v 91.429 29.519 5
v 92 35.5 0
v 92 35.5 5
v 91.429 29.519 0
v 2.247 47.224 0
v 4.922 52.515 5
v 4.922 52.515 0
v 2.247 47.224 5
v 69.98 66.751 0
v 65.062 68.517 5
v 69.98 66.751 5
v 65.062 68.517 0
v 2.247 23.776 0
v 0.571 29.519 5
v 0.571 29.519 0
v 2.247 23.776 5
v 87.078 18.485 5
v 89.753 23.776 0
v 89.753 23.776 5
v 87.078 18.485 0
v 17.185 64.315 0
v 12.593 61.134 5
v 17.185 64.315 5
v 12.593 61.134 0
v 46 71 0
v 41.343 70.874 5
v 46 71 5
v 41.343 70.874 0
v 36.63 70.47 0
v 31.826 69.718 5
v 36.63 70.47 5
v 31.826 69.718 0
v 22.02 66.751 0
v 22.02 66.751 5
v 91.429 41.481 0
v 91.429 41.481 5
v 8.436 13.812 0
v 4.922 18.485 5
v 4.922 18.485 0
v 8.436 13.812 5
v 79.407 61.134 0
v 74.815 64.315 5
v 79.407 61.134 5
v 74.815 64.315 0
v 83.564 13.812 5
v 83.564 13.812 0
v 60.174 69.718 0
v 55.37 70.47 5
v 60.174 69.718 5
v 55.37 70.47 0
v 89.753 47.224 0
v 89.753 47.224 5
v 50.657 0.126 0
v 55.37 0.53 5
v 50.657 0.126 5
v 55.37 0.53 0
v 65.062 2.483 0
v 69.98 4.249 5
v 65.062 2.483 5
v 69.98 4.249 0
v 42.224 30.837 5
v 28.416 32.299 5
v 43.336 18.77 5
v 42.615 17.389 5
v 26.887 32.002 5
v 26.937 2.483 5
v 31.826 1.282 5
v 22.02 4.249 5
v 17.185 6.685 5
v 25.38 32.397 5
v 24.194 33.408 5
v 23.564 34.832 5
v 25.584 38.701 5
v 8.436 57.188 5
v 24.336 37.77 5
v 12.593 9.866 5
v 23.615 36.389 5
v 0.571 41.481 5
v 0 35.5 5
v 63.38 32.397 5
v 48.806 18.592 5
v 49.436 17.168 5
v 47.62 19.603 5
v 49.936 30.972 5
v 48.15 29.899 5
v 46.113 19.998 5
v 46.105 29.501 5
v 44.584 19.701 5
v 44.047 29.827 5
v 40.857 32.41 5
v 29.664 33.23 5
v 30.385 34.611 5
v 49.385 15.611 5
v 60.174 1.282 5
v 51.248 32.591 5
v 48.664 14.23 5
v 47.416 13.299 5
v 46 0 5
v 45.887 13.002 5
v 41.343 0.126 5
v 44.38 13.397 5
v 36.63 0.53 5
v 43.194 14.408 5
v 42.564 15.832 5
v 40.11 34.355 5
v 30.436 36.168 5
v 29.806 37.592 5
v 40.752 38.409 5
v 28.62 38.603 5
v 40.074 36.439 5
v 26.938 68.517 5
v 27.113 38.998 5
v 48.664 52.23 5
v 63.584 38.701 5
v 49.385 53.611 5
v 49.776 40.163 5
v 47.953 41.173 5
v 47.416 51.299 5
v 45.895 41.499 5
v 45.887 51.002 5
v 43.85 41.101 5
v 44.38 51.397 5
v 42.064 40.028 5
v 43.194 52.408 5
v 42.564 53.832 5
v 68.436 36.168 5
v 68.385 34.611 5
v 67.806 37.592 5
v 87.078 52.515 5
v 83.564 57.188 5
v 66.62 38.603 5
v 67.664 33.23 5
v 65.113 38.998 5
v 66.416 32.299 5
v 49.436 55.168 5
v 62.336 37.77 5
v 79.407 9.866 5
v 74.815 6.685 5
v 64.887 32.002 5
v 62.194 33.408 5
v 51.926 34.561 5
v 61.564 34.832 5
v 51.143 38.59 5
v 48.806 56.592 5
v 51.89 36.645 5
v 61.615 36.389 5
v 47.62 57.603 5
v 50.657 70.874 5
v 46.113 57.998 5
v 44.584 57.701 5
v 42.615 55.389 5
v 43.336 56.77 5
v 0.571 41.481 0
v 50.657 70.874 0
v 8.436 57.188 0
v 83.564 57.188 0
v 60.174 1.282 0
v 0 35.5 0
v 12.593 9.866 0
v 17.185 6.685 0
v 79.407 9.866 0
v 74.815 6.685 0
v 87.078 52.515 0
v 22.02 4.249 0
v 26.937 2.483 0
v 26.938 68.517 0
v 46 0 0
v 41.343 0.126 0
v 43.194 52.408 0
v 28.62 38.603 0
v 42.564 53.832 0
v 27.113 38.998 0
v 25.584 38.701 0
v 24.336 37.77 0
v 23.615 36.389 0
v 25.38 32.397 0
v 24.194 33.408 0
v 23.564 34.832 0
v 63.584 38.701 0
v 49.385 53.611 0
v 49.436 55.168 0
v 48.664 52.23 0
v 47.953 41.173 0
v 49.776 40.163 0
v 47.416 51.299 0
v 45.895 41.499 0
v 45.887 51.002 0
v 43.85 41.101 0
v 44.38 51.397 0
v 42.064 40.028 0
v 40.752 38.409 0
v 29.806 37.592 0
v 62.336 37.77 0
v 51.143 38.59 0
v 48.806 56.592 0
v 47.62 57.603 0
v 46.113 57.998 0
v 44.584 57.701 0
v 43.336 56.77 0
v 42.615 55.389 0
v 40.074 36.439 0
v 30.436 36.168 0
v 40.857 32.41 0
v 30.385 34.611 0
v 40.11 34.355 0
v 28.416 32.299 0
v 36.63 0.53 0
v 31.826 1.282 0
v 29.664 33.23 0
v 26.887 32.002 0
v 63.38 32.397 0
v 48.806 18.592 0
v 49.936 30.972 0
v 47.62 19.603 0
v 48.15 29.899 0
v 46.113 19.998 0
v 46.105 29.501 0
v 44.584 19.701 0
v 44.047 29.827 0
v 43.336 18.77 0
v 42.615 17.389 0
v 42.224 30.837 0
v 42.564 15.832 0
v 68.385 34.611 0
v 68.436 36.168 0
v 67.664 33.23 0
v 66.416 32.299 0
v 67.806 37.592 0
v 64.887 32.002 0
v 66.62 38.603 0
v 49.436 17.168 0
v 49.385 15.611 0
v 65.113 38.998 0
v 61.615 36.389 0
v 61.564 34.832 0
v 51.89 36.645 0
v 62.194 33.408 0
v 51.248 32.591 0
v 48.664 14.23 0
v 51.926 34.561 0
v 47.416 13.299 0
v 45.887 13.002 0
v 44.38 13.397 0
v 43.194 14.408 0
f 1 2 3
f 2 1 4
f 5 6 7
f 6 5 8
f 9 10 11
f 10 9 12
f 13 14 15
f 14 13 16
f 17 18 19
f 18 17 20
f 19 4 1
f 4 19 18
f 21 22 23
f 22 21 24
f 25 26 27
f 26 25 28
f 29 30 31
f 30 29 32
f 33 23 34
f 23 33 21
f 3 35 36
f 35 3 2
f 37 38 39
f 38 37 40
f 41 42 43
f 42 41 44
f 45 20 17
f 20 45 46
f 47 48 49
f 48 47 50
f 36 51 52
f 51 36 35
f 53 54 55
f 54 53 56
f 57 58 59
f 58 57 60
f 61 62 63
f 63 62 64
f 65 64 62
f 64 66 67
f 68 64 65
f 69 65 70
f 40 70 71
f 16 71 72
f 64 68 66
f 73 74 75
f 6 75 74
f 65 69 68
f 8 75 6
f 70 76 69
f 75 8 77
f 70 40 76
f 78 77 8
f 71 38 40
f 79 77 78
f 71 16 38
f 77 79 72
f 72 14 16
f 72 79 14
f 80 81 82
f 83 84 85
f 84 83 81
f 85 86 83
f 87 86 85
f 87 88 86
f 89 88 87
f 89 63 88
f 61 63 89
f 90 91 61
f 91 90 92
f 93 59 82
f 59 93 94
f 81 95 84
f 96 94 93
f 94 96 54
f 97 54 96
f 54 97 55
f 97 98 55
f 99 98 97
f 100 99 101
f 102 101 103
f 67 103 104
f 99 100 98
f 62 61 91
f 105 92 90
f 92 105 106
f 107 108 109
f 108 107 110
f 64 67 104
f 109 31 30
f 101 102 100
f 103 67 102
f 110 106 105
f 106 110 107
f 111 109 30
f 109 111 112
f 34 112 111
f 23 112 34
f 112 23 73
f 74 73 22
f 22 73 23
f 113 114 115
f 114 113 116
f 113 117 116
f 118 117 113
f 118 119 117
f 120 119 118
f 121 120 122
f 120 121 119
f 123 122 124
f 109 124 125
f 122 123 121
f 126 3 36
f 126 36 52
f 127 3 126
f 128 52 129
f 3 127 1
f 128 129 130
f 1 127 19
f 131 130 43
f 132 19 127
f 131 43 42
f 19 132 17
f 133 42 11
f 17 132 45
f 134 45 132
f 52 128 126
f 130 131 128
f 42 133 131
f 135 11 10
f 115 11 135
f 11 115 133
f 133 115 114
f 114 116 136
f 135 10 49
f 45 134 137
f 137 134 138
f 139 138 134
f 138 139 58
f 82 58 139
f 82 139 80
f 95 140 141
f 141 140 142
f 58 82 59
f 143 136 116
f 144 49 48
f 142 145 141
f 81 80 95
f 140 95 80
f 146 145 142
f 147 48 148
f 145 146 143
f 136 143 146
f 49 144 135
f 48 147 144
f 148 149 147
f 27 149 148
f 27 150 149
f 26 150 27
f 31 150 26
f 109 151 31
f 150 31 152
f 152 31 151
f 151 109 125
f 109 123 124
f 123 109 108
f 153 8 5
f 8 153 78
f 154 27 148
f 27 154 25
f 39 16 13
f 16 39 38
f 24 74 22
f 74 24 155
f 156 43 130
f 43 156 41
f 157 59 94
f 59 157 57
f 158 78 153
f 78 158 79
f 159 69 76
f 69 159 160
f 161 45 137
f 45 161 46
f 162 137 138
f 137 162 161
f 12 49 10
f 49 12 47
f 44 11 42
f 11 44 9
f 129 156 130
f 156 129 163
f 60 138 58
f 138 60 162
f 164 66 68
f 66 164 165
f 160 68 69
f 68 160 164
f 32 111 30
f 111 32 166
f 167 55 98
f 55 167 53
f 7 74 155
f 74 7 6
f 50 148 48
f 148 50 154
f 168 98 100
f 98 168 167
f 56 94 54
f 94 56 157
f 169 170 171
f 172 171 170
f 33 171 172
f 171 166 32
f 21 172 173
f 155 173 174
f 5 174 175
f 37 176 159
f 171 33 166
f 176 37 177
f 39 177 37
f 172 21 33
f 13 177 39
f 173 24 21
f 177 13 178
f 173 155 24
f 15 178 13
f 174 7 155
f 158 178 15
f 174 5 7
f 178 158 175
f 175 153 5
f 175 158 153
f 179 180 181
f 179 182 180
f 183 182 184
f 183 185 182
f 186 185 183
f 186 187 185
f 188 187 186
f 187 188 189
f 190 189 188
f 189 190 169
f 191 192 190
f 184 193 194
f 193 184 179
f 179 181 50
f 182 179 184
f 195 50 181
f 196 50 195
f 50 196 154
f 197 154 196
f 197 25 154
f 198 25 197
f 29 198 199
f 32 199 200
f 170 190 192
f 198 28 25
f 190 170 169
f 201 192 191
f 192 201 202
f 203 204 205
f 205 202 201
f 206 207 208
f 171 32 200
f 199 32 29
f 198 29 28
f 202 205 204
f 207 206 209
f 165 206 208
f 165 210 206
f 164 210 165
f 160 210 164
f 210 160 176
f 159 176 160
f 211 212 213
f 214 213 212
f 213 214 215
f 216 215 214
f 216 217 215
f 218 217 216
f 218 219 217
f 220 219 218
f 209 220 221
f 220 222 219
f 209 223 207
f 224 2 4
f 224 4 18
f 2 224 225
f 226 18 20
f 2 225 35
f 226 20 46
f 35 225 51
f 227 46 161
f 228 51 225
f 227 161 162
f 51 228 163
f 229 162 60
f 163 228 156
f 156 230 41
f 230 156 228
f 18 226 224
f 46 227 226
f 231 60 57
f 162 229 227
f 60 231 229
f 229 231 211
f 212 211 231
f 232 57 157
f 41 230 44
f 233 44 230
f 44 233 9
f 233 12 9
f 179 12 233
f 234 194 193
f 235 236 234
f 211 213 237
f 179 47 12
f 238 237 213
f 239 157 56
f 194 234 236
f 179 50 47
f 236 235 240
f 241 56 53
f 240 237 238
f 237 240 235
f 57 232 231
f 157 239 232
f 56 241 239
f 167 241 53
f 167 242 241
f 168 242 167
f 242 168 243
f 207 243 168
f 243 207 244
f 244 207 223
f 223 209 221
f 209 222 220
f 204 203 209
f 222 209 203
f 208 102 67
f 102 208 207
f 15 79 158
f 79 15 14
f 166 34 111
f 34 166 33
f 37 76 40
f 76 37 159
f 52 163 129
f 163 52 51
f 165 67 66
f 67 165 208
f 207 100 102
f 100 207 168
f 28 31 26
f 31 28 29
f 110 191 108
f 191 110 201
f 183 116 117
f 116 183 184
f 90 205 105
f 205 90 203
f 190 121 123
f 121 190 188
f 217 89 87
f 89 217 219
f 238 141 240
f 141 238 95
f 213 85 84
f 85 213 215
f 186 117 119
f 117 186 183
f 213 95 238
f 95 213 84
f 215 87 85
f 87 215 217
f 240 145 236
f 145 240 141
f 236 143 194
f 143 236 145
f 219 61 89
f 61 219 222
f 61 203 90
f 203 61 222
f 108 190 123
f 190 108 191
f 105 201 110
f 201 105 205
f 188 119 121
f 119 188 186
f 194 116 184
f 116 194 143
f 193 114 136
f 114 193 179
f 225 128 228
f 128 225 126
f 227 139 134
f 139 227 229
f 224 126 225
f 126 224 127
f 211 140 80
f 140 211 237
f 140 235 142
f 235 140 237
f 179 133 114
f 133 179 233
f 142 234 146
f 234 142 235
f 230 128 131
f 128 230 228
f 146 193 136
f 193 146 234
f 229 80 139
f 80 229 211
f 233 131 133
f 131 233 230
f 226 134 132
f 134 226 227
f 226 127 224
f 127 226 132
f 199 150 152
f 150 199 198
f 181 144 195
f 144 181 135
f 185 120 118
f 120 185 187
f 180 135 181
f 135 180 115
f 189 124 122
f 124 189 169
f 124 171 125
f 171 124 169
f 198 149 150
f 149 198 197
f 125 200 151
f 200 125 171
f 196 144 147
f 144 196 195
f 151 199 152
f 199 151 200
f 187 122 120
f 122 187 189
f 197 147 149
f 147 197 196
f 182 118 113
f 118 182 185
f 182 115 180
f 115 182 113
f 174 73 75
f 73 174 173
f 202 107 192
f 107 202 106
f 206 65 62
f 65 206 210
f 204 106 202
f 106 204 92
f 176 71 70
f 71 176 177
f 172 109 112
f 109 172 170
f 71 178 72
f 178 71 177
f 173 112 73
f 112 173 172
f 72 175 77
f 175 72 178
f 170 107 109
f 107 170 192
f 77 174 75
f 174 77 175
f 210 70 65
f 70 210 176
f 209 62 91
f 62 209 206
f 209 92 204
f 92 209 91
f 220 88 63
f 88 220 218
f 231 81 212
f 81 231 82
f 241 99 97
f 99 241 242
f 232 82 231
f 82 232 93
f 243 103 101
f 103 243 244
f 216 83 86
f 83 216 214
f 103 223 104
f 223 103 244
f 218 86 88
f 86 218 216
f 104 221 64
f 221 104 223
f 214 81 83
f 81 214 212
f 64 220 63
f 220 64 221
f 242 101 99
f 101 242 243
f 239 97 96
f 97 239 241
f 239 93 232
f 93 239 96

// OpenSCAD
$fn = 32;

// ----------------------------------------------------------------------
// Cam plate: double_lobe cam, base R32
// ----------------------------------------------------------------------

// --- parameters (mm) ---
base_r = 32;              // base circle radius
lobe_h = 14;              // cam lobe rise
bore_r = 6;               // shaft bore radius
plate_t = 5;              // plate thickness, Z (extrusion height)
ring_r = 19;              // lightening ring radius
bolt_r = 3.5;             // lightening hole radius
fit_tol = 0.1;            // declared fit tolerance (prompt contract)
free_tol = 0.5;           // declared free tolerance (prompt contract)

profile = [[92, 35.5], [91.429, 41.481], [89.753, 47.224], [87.078, 52.515], [83.564, 57.188], [79.407, 61.134], [74.815, 64.315], [69.98, 66.751], [65.062, 68.517], [60.174, 69.718], [55.37, 70.47], [50.657, 70.874], [46, 71], [41.343, 70.874], [36.63, 70.47], [31.826, 69.718], [26.938, 68.517], [22.02, 66.751], [17.185, 64.315], [12.593, 61.134], [8.436, 57.188], [4.922, 52.515], [2.247, 47.224], [0.571, 41.481], [0, 35.5], [0.571, 29.519], [2.247, 23.776], [4.922, 18.485], [8.436, 13.812], [12.593, 9.866], [17.185, 6.685], [22.02, 4.249], [26.937, 2.483], [31.826, 1.282], [36.63, 0.53], [41.343, 0.126], [46, 0], [50.657, 0.126], [55.37, 0.53], [60.174, 1.282], [65.062, 2.483], [69.98, 4.249], [74.815, 6.685], [79.407, 9.866], [83.564, 13.812], [87.078, 18.485], [89.753, 23.776], [91.429, 29.519]];  // primary outline, 48 points, counter clockwise
void_1 = [[51.89, 36.645], [51.143, 38.59], [49.776, 40.163], [47.953, 41.173], [45.895, 41.499], [43.85, 41.101], [42.064, 40.028], [40.752, 38.409], [40.074, 36.439], [40.11, 34.355], [40.857, 32.41], [42.224, 30.837], [44.047, 29.827], [46.105, 29.501], [48.15, 29.899], [49.936, 30.972], [51.248, 32.591], [51.926, 34.561]];  // shaft bore, 18 points
void_2 = [[68.436, 36.168], [67.806, 37.592], [66.62, 38.603], [65.113, 38.998], [63.584, 38.701], [62.336, 37.77], [61.615, 36.389], [61.564, 34.832], [62.194, 33.408], [63.38, 32.397], [64.887, 32.002], [66.416, 32.299], [67.664, 33.23], [68.385, 34.611]];  // lightening hole 1, 14 points
void_3 = [[49.436, 55.168], [48.806, 56.592], [47.62, 57.603], [46.113, 57.998], [44.584, 57.701], [43.336, 56.77], [42.615, 55.389], [42.564, 53.832], [43.194, 52.408], [44.38, 51.397], [45.887, 51.002], [47.416, 51.299], [48.664, 52.23], [49.385, 53.611]];  // lightening hole 2, 14 points
void_4 = [[30.436, 36.168], [29.806, 37.592], [28.62, 38.603], [27.113, 38.998], [25.584, 38.701], [24.336, 37.77], [23.615, 36.389], [23.564, 34.832], [24.194, 33.408], [25.38, 32.397], [26.887, 32.002], [28.416, 32.299], [29.664, 33.23], [30.385, 34.611]];  // lightening hole 3, 14 points
void_5 = [[49.436, 17.168], [48.806, 18.592], [47.62, 19.603], [46.113, 19.998], [44.584, 19.701], [43.336, 18.77], [42.615, 17.389], [42.564, 15.832], [43.194, 14.408], [44.38, 13.397], [45.887, 13.002], [47.416, 13.299], [48.664, 14.23], [49.385, 15.611]];  // lightening hole 4, 14 points

// --- the one profile operation ---
difference() {
  linear_extrude(height = plate_t) polygon(points = profile);
  translate([0, 0, -1])
    linear_extrude(height = plate_t + 2) polygon(points = void_1);
  translate([0, 0, -1])
    linear_extrude(height = plate_t + 2) polygon(points = void_2);
  translate([0, 0, -1])
    linear_extrude(height = plate_t + 2) polygon(points = void_3);
  translate([0, 0, -1])
    linear_extrude(height = plate_t + 2) polygon(points = void_4);
  translate([0, 0, -1])
    linear_extrude(height = plate_t + 2) polygon(points = void_5);
}
